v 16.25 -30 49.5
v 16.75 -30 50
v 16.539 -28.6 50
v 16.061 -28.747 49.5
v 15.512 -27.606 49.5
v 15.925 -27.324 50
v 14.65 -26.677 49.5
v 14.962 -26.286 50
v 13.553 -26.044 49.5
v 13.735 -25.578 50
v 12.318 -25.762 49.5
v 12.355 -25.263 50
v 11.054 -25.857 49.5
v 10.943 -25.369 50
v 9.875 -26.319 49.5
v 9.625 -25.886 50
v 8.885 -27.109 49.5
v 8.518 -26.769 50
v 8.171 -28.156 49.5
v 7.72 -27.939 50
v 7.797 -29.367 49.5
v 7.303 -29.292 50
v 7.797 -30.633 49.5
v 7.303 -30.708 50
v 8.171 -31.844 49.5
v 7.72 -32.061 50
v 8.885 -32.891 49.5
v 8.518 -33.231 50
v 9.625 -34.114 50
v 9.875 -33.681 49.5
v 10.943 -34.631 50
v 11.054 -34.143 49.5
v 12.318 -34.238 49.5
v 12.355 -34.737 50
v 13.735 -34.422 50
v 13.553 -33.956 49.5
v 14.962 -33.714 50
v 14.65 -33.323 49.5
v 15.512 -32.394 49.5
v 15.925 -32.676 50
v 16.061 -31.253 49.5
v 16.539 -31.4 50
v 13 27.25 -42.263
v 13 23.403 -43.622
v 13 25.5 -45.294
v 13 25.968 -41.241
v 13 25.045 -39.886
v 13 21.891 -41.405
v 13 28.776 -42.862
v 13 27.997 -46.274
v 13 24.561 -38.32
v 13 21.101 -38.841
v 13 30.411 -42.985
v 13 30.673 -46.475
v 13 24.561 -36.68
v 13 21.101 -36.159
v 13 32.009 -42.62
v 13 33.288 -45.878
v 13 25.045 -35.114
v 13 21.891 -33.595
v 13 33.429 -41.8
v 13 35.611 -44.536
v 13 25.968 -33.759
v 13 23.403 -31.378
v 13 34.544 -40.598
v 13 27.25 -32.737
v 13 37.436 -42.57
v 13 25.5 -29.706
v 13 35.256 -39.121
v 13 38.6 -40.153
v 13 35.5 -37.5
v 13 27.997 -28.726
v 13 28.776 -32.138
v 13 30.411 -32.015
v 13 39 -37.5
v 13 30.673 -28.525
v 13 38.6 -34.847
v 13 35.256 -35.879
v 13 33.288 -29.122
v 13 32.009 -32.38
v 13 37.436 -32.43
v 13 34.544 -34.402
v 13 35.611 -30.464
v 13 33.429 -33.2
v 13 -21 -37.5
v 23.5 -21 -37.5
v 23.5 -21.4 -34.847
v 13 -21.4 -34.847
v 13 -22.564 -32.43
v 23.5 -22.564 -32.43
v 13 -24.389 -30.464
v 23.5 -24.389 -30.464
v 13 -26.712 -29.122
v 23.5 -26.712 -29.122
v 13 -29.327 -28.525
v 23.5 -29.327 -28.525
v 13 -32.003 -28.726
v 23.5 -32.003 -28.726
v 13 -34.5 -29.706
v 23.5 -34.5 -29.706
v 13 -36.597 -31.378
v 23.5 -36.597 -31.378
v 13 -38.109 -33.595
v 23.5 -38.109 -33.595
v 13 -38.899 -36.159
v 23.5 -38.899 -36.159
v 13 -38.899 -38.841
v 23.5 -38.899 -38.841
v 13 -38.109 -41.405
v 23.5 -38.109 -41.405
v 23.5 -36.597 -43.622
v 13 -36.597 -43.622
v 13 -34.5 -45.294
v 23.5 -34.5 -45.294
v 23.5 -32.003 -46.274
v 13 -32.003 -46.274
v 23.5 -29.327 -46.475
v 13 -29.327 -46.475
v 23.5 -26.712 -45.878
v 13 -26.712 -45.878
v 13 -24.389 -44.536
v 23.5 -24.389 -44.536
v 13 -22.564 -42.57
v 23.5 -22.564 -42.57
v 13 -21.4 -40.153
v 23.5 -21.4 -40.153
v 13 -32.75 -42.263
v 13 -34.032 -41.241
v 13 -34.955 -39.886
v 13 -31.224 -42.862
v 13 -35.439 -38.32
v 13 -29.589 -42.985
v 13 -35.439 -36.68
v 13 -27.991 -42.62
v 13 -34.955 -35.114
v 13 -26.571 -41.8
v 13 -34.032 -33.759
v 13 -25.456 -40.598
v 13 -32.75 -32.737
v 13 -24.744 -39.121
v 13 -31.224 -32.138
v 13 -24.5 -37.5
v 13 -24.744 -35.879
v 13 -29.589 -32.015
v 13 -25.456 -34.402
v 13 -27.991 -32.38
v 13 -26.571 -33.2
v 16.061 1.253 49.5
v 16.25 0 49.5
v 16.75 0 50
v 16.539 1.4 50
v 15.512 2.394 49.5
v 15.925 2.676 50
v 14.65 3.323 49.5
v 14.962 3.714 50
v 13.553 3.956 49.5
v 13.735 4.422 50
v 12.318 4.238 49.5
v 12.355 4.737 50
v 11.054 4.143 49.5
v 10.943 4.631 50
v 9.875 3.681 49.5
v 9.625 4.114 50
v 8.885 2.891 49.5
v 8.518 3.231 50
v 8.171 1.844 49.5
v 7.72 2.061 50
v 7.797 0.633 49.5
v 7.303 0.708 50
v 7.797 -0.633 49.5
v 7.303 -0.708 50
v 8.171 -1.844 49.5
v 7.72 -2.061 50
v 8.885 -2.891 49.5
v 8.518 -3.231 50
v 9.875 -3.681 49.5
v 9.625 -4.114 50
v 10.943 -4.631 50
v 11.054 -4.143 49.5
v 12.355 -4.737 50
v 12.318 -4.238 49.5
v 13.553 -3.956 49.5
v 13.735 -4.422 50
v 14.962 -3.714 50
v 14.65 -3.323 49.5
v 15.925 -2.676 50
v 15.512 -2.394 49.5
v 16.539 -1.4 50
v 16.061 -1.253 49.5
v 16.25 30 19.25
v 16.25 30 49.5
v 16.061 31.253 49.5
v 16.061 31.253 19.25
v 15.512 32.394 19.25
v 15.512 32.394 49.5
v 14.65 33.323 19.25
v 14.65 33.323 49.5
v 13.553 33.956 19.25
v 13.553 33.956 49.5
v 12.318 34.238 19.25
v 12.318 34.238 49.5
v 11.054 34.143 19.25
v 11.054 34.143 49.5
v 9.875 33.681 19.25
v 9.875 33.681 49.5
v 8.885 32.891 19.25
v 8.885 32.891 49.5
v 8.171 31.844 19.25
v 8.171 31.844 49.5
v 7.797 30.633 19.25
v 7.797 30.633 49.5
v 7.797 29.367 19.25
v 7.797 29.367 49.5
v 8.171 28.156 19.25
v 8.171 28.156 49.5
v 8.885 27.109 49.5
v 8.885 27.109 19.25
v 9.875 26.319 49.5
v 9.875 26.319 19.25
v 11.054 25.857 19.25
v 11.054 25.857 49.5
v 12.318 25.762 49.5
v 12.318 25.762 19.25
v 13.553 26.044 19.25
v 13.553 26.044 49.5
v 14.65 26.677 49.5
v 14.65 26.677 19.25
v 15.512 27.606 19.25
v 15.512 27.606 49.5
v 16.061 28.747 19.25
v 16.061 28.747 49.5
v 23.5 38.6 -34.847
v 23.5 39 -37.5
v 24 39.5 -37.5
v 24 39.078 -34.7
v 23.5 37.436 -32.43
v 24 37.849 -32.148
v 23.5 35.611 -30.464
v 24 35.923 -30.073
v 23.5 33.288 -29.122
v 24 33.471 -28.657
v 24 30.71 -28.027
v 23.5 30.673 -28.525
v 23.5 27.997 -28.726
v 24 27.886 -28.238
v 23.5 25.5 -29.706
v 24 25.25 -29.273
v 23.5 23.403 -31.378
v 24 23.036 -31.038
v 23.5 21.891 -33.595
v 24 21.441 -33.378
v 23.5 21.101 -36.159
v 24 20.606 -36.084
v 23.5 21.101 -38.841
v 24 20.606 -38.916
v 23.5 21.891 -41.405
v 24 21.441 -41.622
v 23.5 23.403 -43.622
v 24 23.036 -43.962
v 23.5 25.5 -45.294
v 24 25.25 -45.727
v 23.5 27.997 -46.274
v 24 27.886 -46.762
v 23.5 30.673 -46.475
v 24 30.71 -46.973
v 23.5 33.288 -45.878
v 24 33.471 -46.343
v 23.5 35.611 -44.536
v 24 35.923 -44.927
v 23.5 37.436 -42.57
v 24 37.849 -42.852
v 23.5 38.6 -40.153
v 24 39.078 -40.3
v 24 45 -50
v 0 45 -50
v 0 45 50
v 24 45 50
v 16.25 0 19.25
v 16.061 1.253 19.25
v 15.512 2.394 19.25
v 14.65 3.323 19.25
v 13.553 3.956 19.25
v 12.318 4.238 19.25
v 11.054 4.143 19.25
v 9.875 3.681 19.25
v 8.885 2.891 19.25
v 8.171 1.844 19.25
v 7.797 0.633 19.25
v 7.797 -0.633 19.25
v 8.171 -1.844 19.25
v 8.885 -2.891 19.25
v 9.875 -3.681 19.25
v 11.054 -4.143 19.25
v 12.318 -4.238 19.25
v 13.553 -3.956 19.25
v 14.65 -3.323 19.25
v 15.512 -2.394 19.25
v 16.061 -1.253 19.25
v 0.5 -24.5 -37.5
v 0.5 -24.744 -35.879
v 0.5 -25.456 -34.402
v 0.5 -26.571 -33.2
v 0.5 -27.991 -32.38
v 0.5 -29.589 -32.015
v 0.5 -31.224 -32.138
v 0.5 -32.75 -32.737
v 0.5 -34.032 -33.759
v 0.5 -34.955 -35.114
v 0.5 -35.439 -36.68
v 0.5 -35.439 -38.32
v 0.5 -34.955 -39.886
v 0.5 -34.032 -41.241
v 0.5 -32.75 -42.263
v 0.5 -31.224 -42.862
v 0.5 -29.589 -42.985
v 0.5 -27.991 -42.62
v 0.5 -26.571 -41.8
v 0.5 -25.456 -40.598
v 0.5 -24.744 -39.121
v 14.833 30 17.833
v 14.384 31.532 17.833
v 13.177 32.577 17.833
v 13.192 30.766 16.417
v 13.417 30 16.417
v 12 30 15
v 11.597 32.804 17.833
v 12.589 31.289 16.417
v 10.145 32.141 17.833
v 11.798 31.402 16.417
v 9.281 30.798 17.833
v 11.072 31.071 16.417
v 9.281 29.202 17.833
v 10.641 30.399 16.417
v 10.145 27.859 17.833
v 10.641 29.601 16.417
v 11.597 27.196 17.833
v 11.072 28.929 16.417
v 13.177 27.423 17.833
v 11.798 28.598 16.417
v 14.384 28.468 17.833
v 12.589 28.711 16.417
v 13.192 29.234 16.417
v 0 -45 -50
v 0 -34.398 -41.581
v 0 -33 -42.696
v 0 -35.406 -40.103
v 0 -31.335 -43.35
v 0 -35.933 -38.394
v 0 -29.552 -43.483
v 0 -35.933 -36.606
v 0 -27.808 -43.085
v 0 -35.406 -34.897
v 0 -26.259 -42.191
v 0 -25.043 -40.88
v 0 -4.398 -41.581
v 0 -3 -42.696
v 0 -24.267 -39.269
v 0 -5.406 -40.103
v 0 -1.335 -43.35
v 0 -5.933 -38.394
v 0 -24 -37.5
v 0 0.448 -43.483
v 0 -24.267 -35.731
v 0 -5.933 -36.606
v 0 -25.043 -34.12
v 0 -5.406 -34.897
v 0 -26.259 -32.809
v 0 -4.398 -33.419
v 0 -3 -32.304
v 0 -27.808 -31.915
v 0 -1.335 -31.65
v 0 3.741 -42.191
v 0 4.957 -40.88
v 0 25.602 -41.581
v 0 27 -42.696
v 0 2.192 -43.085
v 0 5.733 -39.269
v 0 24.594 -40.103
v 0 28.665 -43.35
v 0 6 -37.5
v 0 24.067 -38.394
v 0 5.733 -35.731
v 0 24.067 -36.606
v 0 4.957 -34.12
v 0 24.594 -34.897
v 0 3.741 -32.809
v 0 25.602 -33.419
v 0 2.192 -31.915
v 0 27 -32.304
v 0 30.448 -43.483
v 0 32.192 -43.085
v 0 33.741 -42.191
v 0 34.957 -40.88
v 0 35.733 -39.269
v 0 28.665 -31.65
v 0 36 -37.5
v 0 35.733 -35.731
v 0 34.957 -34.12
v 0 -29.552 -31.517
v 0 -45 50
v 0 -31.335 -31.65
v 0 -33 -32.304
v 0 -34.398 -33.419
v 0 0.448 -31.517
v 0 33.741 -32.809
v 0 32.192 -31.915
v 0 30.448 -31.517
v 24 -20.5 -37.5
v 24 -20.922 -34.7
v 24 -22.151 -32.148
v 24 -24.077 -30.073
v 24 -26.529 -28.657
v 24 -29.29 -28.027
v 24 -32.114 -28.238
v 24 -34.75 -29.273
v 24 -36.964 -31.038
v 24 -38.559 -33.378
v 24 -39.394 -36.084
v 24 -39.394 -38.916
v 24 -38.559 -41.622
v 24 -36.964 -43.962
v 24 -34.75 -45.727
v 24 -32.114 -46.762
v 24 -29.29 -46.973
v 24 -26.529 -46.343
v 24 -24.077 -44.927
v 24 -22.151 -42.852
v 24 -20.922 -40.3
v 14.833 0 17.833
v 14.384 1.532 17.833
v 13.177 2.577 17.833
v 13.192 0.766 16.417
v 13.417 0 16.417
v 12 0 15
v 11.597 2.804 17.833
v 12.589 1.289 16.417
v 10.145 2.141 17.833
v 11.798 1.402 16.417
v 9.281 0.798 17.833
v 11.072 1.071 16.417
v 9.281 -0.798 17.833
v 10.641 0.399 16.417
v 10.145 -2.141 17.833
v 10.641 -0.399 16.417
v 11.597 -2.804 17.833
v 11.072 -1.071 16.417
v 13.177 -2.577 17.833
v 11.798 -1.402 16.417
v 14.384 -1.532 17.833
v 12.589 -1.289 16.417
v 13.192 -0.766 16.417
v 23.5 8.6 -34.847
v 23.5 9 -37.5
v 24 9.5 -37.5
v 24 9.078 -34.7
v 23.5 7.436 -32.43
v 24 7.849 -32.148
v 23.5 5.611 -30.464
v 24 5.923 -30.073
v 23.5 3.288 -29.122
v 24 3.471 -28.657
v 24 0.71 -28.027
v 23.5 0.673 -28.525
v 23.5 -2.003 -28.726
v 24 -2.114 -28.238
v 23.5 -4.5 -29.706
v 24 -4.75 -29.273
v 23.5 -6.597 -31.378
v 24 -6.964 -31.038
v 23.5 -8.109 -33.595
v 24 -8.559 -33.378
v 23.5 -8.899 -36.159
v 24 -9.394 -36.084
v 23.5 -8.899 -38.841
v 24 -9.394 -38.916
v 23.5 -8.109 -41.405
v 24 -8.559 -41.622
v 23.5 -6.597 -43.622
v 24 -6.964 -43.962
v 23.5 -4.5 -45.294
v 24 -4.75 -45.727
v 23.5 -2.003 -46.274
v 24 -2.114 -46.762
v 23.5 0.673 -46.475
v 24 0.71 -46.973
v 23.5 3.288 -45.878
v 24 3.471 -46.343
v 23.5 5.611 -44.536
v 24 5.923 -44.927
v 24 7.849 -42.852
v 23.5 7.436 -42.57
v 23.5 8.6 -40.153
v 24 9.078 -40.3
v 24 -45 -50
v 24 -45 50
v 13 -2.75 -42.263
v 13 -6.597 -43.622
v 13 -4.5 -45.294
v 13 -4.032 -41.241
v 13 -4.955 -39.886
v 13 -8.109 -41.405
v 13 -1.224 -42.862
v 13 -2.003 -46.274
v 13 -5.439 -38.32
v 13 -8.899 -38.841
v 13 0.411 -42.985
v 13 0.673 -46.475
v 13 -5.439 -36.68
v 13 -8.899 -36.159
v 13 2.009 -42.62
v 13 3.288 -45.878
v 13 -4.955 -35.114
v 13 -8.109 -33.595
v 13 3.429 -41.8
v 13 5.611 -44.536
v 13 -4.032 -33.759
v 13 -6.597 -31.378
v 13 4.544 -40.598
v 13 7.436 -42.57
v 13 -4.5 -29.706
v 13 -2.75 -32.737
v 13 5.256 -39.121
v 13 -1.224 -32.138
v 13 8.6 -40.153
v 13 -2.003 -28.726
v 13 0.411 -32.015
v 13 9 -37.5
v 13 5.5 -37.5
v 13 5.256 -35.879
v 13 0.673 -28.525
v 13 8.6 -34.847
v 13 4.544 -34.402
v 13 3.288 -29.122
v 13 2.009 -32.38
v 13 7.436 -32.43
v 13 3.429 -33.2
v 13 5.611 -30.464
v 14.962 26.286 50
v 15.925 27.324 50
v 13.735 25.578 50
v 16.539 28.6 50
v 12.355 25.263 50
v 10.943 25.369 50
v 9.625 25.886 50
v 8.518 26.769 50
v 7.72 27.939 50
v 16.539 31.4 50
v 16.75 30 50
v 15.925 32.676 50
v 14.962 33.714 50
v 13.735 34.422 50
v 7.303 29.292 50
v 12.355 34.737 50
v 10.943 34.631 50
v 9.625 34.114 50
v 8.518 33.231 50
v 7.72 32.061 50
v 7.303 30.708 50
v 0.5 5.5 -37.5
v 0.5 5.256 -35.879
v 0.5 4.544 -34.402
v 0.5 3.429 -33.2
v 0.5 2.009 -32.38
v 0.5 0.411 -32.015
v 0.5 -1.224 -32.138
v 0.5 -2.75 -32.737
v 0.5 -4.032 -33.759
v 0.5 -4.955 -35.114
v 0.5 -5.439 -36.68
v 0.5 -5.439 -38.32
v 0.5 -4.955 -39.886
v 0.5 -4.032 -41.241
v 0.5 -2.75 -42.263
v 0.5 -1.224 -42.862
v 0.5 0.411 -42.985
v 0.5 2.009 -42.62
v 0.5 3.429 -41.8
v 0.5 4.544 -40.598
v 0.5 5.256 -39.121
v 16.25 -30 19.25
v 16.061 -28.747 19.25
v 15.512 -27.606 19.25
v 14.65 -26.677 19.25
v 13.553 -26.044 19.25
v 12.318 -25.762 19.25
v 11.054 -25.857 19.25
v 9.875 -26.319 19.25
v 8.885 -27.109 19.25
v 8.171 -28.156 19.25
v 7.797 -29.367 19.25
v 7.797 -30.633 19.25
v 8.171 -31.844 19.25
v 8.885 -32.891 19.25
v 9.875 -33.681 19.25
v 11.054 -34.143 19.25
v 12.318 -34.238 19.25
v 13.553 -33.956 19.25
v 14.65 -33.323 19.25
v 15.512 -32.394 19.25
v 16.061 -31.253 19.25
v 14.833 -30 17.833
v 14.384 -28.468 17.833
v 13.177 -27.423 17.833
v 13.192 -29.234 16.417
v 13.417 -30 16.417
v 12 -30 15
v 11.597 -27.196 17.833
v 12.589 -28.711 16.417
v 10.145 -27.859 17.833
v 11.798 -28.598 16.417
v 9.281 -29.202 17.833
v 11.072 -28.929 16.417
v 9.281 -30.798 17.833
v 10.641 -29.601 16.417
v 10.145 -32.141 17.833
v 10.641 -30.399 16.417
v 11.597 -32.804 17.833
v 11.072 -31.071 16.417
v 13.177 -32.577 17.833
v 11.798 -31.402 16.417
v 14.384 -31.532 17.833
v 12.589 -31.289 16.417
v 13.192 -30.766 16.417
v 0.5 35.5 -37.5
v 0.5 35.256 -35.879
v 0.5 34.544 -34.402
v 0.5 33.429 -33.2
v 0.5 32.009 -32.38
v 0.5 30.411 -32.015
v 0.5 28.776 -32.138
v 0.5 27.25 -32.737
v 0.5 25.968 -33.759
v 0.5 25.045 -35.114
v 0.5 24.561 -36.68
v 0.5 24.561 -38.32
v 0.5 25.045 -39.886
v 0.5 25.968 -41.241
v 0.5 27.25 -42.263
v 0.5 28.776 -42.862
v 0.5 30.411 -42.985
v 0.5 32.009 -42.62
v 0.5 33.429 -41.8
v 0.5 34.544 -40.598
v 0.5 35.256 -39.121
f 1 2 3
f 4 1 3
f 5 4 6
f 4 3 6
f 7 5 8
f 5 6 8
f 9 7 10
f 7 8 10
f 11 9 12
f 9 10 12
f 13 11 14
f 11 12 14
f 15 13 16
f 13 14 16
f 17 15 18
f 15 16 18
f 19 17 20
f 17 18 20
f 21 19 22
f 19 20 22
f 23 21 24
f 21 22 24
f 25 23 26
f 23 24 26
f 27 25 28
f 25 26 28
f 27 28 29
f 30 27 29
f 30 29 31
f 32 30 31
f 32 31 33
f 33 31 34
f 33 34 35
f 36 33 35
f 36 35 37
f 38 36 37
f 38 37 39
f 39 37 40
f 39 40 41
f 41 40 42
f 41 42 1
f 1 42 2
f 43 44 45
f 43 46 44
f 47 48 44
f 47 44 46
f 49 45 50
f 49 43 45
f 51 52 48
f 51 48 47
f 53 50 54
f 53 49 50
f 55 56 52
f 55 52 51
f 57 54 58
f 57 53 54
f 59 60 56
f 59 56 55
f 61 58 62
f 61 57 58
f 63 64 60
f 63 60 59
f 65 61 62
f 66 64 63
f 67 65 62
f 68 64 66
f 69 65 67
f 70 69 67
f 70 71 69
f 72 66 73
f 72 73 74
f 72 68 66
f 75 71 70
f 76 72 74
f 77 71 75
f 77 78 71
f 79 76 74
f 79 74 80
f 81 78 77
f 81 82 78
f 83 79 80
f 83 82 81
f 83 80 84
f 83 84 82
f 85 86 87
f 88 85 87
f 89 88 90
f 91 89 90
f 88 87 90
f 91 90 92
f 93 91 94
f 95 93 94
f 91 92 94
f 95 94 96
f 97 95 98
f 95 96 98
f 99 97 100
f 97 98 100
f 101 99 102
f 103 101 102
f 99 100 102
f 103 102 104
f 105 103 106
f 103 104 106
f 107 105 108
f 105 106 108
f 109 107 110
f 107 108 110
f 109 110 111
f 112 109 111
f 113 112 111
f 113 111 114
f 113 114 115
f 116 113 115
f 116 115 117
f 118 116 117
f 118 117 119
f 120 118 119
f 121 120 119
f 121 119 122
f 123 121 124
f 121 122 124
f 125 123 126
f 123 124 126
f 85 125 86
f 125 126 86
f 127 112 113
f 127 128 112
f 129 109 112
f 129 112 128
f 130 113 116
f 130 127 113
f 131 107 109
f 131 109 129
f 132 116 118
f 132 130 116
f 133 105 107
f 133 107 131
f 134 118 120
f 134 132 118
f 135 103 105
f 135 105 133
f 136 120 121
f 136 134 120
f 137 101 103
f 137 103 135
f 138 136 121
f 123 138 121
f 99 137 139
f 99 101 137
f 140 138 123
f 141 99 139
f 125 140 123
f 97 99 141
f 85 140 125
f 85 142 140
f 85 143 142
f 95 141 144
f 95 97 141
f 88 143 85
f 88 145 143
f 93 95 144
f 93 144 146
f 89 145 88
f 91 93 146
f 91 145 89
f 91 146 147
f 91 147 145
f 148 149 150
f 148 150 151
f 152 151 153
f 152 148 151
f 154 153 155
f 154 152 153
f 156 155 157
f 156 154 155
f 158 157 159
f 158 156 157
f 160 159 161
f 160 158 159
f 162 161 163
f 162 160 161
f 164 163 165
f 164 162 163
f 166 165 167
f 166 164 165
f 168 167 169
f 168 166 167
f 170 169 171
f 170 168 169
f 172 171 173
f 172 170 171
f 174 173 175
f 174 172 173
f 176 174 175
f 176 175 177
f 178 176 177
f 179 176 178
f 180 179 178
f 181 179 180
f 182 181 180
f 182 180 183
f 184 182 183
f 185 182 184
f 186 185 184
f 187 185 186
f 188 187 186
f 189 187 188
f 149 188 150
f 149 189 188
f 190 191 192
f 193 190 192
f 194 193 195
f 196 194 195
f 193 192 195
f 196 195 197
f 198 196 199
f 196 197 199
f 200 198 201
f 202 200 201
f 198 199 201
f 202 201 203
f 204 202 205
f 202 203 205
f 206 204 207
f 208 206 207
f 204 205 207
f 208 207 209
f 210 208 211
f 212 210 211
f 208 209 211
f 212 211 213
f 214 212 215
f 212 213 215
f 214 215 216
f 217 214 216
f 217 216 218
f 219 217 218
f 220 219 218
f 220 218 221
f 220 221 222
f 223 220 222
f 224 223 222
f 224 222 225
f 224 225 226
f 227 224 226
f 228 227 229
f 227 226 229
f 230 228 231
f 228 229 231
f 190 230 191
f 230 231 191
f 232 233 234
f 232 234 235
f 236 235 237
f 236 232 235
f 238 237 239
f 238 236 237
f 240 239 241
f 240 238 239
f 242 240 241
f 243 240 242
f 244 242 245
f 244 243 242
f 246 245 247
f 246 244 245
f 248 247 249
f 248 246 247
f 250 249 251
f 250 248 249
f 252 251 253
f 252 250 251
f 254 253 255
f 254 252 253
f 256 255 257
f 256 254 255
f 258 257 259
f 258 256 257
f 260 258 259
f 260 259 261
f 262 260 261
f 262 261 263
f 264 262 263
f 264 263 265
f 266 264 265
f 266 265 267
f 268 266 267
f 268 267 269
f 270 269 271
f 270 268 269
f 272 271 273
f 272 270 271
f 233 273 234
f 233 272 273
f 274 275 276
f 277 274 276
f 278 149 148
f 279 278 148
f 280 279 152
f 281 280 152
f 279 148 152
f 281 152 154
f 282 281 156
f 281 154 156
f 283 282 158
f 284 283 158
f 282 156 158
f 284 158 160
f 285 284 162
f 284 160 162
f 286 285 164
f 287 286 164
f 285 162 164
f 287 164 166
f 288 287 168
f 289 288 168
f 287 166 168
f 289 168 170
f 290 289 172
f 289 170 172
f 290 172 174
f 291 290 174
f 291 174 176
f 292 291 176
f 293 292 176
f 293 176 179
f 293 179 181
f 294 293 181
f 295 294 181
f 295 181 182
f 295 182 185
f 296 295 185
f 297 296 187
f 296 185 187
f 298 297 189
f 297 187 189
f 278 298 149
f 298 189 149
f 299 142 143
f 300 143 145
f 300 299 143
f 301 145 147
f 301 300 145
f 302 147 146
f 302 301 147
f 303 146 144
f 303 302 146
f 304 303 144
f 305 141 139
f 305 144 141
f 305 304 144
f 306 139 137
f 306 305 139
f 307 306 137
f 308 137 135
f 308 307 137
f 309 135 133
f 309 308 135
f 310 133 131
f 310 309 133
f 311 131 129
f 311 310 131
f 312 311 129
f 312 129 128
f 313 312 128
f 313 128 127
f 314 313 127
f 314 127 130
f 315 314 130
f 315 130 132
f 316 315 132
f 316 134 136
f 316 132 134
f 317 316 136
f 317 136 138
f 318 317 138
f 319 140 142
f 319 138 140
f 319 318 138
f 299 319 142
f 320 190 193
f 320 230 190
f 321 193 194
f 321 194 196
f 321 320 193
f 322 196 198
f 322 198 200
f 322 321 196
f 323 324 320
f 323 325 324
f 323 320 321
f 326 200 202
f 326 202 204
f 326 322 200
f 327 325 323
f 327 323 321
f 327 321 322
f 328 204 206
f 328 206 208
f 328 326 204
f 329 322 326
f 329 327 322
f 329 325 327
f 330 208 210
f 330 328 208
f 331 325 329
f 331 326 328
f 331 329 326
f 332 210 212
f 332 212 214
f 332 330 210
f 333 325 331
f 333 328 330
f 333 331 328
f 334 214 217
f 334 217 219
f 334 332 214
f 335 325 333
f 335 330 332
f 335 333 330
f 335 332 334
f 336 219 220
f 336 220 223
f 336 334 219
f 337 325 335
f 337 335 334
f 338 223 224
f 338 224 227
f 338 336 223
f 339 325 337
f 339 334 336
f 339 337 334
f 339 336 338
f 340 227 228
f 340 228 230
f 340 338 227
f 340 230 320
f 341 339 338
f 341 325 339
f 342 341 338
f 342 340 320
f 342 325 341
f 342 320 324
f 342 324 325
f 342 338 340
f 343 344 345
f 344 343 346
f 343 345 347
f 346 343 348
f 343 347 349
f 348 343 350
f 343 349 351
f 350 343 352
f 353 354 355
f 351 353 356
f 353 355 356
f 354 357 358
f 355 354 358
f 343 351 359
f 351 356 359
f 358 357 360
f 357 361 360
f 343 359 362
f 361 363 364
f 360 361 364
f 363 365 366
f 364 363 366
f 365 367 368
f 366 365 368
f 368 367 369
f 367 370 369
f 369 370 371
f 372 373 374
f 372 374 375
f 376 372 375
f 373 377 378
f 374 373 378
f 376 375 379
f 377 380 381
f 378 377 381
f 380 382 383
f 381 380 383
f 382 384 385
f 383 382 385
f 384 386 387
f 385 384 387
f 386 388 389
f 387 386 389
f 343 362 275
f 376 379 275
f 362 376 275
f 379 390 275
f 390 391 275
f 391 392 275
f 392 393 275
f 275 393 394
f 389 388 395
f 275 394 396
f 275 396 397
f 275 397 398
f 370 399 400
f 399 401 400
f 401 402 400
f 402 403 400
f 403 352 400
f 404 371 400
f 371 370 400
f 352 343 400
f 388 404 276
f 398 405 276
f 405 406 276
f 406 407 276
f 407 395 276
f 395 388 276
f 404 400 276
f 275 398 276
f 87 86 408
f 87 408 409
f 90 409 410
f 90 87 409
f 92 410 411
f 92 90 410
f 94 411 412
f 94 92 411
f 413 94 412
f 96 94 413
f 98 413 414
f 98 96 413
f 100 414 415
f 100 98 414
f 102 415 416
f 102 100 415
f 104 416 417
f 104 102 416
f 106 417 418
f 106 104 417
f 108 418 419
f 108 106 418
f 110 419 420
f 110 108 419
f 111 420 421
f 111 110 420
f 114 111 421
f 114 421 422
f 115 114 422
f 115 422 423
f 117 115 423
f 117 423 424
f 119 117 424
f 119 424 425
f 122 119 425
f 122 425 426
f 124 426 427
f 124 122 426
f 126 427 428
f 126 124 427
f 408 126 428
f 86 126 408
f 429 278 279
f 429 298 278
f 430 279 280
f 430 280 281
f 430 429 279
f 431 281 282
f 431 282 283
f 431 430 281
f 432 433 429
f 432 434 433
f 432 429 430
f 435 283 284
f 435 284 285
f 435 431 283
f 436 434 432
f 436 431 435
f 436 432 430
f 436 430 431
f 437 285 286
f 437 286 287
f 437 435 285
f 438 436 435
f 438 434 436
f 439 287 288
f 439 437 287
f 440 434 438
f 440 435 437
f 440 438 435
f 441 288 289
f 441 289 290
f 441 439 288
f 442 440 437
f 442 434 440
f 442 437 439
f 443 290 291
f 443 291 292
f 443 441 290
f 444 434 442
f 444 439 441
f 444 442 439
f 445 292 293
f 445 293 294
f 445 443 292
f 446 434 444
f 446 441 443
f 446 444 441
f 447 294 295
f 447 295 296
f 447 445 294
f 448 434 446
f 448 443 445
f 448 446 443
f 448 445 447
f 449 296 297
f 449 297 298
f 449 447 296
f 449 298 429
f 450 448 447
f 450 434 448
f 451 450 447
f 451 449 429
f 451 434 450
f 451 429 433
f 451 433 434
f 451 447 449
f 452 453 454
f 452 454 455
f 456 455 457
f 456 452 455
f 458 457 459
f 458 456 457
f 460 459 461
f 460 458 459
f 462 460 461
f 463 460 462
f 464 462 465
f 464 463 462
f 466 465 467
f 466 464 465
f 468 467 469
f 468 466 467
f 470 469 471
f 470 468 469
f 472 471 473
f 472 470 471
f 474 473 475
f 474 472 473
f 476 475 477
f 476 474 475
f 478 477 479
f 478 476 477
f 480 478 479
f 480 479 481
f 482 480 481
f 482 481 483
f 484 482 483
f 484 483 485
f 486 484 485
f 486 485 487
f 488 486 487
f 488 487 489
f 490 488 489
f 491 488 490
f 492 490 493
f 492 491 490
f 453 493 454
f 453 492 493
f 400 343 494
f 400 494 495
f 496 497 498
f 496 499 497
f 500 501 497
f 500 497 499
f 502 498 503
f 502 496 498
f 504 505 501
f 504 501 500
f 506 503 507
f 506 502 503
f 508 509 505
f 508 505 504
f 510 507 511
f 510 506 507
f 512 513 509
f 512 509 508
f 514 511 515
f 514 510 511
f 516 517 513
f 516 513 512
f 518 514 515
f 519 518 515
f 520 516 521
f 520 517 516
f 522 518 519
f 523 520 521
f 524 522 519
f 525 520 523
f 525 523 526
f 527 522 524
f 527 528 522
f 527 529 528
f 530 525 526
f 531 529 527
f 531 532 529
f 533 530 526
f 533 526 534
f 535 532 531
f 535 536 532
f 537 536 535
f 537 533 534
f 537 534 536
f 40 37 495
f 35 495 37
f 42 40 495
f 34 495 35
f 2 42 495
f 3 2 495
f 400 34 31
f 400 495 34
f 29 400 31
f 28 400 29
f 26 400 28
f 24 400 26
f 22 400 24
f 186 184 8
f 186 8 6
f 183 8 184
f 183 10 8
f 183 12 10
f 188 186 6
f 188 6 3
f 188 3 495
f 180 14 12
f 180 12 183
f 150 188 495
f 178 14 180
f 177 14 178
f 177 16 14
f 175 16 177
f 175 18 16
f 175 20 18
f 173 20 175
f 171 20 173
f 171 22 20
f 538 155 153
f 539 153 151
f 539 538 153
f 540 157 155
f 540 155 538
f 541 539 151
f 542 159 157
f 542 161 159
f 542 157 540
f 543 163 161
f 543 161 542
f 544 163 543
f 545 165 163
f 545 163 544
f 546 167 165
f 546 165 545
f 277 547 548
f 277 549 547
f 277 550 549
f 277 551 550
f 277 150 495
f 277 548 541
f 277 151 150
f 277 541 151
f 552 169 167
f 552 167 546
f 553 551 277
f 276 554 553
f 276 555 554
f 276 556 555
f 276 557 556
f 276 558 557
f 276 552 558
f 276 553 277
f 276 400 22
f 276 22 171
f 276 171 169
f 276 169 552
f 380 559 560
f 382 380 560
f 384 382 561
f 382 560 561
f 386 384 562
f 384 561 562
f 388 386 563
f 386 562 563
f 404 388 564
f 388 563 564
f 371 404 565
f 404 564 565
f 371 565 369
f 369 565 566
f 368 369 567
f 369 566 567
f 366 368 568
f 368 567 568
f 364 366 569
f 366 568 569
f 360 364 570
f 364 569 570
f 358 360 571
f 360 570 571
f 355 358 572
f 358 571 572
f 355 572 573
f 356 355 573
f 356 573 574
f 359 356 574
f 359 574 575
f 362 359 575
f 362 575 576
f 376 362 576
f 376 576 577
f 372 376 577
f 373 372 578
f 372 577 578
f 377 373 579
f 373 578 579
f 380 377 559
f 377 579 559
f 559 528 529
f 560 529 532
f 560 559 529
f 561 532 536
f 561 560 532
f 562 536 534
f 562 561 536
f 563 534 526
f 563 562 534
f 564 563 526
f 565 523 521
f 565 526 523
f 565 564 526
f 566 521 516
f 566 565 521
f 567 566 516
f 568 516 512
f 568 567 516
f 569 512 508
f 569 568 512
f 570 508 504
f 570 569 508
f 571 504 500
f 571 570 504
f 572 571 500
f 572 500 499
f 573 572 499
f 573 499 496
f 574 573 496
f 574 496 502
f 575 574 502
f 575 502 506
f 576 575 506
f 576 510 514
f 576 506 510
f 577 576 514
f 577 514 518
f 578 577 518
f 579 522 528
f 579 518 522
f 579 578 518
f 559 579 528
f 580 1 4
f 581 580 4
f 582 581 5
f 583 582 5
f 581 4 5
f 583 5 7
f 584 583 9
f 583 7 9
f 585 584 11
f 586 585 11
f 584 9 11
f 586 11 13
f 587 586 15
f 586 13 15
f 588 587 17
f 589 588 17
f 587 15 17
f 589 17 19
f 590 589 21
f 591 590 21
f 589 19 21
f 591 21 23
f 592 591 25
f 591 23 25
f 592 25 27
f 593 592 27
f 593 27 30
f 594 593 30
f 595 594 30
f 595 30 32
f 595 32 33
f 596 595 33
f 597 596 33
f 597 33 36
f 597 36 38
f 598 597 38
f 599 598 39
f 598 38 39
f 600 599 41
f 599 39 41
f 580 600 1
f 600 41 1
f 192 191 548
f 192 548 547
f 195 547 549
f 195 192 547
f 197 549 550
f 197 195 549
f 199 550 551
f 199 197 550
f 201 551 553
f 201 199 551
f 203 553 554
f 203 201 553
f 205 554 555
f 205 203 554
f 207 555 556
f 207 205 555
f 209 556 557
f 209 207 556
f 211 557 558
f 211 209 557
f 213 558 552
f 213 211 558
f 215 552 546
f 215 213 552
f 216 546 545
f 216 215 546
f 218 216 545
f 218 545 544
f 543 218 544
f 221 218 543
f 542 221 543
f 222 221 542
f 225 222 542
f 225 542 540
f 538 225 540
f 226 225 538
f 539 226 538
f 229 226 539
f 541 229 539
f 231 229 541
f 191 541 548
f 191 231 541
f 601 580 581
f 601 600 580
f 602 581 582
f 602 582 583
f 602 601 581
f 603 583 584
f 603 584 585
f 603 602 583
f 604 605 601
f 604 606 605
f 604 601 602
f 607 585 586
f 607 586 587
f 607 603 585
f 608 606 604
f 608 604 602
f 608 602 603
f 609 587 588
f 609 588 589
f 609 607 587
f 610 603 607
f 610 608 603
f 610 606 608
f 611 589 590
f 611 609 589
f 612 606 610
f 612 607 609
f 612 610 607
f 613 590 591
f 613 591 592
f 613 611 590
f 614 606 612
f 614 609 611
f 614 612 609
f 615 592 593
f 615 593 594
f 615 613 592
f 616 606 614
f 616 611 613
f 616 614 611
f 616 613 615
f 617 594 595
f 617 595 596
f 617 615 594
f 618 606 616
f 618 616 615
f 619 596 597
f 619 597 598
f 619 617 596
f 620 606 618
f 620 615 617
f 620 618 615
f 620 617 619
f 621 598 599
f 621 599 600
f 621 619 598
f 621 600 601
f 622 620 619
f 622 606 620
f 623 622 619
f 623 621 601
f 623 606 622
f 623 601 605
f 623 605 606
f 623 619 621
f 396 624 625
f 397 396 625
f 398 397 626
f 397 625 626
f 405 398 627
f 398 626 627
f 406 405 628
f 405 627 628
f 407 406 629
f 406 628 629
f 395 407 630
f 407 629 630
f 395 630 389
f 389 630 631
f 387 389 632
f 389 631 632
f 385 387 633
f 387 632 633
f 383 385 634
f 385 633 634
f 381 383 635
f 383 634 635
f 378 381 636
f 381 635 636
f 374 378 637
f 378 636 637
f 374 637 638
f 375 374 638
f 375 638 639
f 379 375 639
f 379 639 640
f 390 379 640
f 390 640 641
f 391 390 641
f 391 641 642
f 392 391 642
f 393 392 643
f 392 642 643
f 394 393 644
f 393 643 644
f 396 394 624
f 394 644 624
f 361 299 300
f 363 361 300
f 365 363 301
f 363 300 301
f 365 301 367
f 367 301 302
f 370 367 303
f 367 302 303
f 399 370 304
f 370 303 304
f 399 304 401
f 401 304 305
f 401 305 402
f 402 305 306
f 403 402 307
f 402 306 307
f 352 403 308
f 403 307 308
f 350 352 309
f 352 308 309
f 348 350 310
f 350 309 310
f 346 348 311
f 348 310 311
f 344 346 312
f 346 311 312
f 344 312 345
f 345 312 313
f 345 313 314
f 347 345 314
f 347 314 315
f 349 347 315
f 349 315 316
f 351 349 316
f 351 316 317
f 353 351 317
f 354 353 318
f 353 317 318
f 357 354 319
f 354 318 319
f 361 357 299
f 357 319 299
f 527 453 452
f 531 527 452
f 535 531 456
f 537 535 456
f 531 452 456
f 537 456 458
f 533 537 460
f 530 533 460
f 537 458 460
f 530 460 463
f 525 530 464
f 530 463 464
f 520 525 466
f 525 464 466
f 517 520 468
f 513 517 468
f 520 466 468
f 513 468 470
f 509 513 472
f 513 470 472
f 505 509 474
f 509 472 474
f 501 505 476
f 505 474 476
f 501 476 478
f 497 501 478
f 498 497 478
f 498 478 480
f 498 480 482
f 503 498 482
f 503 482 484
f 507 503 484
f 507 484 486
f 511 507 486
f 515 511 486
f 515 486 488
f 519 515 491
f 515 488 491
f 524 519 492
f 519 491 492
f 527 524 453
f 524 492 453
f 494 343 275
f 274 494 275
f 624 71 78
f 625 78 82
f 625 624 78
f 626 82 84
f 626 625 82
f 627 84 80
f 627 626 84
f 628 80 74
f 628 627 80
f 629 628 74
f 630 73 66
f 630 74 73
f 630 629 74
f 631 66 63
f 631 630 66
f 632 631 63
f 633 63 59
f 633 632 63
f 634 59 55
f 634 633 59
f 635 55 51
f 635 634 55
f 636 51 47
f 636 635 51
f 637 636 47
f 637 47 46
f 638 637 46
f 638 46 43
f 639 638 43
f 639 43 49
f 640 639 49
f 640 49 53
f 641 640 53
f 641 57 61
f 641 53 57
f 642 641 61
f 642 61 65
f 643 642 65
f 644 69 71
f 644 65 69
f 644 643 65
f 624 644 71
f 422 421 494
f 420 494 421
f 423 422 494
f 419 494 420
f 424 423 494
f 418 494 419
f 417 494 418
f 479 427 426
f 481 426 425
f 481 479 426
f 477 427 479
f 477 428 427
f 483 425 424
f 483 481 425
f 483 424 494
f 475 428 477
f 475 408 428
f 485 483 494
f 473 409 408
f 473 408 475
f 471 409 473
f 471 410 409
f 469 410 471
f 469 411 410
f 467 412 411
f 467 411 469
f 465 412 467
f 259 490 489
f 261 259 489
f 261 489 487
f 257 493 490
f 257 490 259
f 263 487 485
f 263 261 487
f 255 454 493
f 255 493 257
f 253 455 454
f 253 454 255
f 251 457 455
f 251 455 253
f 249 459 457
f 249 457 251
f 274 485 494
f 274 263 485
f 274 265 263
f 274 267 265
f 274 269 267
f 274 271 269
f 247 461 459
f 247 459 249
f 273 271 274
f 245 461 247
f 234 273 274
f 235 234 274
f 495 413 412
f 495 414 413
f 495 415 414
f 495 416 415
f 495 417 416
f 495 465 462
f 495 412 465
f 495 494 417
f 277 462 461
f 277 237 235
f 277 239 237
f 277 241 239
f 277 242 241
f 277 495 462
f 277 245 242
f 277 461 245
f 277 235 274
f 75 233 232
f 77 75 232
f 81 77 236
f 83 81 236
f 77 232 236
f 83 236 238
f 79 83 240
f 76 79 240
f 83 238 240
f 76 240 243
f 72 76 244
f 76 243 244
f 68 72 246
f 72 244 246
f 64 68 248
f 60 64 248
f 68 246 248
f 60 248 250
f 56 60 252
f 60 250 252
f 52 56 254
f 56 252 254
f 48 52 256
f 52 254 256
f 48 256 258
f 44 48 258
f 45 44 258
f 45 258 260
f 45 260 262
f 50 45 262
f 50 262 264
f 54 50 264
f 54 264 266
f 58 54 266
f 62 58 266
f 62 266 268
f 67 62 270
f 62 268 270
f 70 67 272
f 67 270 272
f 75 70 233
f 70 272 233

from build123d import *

# Parameters (mm, degrees)
F0_W     = 90
F0_H     = 100
F0_R     = 5.5
F1_DEPTH = 24
F2_R     = 9
F3_DEPTH = 11
F4_R     = 4.25
F5_DEPTH = 35
F6_SIZE  = 4.25
F7_SIZE  = 0.5


with BuildPart() as f1:
    # F0 (on Right) → F1 (new body)
    with BuildSketch(Plane.YZ):
        Rectangle(F0_W, F0_H)
        with Locations((-30, -37.5)):
            Circle(F0_R, mode=Mode.SUBTRACT)
        with Locations((0, -37.5)):
            Circle(F0_R, mode=Mode.SUBTRACT)
        with Locations((30, -37.5)):
            Circle(F0_R, mode=Mode.SUBTRACT)
    extrude(amount=F1_DEPTH)

    # F2 (on face) → F3 (cut)
    with BuildSketch(Plane.YZ.offset(24)):
        with Locations((-30, -37.5)):
            Circle(F2_R)
        with Locations((0, -37.5)):
            Circle(F2_R)
        with Locations((30, -37.5)):
            Circle(F2_R)
    extrude(amount=-F3_DEPTH, mode=Mode.SUBTRACT)

    # F4 (on face) → F5 (cut)
    with BuildSketch(Plane.XY.offset(50)):
        with Locations((12, -30)):
            Circle(F4_R)
        with Locations((12, 0)):
            Circle(F4_R)
        with Locations((12, 30)):
            Circle(F4_R)
    extrude(amount=-F5_DEPTH, mode=Mode.SUBTRACT)

    # F6
    f6_edges = [f1.edges().sort_by_distance(p)[0] for p in [
        (7.75, 30, 15),
        (7.75, 0, 15),
        (7.75, -30, 15),
    ]]
    chamfer(f6_edges, length=F6_SIZE)

    # F7
    f7_edges = [f1.edges().sort_by_distance(p)[0] for p in [
        (0, -35.5, -37.5),
        (0, -5.5, -37.5),
        (0, 24.5, -37.5),
        (7.75, 30, 50),
        (7.75, 0, 50),
        (7.75, -30, 50),
        (24, -39, -37.5),
        (24, -9, -37.5),
        (24, 21, -37.5),
    ]]
    chamfer(f7_edges, length=F7_SIZE)


solid = f1.part
